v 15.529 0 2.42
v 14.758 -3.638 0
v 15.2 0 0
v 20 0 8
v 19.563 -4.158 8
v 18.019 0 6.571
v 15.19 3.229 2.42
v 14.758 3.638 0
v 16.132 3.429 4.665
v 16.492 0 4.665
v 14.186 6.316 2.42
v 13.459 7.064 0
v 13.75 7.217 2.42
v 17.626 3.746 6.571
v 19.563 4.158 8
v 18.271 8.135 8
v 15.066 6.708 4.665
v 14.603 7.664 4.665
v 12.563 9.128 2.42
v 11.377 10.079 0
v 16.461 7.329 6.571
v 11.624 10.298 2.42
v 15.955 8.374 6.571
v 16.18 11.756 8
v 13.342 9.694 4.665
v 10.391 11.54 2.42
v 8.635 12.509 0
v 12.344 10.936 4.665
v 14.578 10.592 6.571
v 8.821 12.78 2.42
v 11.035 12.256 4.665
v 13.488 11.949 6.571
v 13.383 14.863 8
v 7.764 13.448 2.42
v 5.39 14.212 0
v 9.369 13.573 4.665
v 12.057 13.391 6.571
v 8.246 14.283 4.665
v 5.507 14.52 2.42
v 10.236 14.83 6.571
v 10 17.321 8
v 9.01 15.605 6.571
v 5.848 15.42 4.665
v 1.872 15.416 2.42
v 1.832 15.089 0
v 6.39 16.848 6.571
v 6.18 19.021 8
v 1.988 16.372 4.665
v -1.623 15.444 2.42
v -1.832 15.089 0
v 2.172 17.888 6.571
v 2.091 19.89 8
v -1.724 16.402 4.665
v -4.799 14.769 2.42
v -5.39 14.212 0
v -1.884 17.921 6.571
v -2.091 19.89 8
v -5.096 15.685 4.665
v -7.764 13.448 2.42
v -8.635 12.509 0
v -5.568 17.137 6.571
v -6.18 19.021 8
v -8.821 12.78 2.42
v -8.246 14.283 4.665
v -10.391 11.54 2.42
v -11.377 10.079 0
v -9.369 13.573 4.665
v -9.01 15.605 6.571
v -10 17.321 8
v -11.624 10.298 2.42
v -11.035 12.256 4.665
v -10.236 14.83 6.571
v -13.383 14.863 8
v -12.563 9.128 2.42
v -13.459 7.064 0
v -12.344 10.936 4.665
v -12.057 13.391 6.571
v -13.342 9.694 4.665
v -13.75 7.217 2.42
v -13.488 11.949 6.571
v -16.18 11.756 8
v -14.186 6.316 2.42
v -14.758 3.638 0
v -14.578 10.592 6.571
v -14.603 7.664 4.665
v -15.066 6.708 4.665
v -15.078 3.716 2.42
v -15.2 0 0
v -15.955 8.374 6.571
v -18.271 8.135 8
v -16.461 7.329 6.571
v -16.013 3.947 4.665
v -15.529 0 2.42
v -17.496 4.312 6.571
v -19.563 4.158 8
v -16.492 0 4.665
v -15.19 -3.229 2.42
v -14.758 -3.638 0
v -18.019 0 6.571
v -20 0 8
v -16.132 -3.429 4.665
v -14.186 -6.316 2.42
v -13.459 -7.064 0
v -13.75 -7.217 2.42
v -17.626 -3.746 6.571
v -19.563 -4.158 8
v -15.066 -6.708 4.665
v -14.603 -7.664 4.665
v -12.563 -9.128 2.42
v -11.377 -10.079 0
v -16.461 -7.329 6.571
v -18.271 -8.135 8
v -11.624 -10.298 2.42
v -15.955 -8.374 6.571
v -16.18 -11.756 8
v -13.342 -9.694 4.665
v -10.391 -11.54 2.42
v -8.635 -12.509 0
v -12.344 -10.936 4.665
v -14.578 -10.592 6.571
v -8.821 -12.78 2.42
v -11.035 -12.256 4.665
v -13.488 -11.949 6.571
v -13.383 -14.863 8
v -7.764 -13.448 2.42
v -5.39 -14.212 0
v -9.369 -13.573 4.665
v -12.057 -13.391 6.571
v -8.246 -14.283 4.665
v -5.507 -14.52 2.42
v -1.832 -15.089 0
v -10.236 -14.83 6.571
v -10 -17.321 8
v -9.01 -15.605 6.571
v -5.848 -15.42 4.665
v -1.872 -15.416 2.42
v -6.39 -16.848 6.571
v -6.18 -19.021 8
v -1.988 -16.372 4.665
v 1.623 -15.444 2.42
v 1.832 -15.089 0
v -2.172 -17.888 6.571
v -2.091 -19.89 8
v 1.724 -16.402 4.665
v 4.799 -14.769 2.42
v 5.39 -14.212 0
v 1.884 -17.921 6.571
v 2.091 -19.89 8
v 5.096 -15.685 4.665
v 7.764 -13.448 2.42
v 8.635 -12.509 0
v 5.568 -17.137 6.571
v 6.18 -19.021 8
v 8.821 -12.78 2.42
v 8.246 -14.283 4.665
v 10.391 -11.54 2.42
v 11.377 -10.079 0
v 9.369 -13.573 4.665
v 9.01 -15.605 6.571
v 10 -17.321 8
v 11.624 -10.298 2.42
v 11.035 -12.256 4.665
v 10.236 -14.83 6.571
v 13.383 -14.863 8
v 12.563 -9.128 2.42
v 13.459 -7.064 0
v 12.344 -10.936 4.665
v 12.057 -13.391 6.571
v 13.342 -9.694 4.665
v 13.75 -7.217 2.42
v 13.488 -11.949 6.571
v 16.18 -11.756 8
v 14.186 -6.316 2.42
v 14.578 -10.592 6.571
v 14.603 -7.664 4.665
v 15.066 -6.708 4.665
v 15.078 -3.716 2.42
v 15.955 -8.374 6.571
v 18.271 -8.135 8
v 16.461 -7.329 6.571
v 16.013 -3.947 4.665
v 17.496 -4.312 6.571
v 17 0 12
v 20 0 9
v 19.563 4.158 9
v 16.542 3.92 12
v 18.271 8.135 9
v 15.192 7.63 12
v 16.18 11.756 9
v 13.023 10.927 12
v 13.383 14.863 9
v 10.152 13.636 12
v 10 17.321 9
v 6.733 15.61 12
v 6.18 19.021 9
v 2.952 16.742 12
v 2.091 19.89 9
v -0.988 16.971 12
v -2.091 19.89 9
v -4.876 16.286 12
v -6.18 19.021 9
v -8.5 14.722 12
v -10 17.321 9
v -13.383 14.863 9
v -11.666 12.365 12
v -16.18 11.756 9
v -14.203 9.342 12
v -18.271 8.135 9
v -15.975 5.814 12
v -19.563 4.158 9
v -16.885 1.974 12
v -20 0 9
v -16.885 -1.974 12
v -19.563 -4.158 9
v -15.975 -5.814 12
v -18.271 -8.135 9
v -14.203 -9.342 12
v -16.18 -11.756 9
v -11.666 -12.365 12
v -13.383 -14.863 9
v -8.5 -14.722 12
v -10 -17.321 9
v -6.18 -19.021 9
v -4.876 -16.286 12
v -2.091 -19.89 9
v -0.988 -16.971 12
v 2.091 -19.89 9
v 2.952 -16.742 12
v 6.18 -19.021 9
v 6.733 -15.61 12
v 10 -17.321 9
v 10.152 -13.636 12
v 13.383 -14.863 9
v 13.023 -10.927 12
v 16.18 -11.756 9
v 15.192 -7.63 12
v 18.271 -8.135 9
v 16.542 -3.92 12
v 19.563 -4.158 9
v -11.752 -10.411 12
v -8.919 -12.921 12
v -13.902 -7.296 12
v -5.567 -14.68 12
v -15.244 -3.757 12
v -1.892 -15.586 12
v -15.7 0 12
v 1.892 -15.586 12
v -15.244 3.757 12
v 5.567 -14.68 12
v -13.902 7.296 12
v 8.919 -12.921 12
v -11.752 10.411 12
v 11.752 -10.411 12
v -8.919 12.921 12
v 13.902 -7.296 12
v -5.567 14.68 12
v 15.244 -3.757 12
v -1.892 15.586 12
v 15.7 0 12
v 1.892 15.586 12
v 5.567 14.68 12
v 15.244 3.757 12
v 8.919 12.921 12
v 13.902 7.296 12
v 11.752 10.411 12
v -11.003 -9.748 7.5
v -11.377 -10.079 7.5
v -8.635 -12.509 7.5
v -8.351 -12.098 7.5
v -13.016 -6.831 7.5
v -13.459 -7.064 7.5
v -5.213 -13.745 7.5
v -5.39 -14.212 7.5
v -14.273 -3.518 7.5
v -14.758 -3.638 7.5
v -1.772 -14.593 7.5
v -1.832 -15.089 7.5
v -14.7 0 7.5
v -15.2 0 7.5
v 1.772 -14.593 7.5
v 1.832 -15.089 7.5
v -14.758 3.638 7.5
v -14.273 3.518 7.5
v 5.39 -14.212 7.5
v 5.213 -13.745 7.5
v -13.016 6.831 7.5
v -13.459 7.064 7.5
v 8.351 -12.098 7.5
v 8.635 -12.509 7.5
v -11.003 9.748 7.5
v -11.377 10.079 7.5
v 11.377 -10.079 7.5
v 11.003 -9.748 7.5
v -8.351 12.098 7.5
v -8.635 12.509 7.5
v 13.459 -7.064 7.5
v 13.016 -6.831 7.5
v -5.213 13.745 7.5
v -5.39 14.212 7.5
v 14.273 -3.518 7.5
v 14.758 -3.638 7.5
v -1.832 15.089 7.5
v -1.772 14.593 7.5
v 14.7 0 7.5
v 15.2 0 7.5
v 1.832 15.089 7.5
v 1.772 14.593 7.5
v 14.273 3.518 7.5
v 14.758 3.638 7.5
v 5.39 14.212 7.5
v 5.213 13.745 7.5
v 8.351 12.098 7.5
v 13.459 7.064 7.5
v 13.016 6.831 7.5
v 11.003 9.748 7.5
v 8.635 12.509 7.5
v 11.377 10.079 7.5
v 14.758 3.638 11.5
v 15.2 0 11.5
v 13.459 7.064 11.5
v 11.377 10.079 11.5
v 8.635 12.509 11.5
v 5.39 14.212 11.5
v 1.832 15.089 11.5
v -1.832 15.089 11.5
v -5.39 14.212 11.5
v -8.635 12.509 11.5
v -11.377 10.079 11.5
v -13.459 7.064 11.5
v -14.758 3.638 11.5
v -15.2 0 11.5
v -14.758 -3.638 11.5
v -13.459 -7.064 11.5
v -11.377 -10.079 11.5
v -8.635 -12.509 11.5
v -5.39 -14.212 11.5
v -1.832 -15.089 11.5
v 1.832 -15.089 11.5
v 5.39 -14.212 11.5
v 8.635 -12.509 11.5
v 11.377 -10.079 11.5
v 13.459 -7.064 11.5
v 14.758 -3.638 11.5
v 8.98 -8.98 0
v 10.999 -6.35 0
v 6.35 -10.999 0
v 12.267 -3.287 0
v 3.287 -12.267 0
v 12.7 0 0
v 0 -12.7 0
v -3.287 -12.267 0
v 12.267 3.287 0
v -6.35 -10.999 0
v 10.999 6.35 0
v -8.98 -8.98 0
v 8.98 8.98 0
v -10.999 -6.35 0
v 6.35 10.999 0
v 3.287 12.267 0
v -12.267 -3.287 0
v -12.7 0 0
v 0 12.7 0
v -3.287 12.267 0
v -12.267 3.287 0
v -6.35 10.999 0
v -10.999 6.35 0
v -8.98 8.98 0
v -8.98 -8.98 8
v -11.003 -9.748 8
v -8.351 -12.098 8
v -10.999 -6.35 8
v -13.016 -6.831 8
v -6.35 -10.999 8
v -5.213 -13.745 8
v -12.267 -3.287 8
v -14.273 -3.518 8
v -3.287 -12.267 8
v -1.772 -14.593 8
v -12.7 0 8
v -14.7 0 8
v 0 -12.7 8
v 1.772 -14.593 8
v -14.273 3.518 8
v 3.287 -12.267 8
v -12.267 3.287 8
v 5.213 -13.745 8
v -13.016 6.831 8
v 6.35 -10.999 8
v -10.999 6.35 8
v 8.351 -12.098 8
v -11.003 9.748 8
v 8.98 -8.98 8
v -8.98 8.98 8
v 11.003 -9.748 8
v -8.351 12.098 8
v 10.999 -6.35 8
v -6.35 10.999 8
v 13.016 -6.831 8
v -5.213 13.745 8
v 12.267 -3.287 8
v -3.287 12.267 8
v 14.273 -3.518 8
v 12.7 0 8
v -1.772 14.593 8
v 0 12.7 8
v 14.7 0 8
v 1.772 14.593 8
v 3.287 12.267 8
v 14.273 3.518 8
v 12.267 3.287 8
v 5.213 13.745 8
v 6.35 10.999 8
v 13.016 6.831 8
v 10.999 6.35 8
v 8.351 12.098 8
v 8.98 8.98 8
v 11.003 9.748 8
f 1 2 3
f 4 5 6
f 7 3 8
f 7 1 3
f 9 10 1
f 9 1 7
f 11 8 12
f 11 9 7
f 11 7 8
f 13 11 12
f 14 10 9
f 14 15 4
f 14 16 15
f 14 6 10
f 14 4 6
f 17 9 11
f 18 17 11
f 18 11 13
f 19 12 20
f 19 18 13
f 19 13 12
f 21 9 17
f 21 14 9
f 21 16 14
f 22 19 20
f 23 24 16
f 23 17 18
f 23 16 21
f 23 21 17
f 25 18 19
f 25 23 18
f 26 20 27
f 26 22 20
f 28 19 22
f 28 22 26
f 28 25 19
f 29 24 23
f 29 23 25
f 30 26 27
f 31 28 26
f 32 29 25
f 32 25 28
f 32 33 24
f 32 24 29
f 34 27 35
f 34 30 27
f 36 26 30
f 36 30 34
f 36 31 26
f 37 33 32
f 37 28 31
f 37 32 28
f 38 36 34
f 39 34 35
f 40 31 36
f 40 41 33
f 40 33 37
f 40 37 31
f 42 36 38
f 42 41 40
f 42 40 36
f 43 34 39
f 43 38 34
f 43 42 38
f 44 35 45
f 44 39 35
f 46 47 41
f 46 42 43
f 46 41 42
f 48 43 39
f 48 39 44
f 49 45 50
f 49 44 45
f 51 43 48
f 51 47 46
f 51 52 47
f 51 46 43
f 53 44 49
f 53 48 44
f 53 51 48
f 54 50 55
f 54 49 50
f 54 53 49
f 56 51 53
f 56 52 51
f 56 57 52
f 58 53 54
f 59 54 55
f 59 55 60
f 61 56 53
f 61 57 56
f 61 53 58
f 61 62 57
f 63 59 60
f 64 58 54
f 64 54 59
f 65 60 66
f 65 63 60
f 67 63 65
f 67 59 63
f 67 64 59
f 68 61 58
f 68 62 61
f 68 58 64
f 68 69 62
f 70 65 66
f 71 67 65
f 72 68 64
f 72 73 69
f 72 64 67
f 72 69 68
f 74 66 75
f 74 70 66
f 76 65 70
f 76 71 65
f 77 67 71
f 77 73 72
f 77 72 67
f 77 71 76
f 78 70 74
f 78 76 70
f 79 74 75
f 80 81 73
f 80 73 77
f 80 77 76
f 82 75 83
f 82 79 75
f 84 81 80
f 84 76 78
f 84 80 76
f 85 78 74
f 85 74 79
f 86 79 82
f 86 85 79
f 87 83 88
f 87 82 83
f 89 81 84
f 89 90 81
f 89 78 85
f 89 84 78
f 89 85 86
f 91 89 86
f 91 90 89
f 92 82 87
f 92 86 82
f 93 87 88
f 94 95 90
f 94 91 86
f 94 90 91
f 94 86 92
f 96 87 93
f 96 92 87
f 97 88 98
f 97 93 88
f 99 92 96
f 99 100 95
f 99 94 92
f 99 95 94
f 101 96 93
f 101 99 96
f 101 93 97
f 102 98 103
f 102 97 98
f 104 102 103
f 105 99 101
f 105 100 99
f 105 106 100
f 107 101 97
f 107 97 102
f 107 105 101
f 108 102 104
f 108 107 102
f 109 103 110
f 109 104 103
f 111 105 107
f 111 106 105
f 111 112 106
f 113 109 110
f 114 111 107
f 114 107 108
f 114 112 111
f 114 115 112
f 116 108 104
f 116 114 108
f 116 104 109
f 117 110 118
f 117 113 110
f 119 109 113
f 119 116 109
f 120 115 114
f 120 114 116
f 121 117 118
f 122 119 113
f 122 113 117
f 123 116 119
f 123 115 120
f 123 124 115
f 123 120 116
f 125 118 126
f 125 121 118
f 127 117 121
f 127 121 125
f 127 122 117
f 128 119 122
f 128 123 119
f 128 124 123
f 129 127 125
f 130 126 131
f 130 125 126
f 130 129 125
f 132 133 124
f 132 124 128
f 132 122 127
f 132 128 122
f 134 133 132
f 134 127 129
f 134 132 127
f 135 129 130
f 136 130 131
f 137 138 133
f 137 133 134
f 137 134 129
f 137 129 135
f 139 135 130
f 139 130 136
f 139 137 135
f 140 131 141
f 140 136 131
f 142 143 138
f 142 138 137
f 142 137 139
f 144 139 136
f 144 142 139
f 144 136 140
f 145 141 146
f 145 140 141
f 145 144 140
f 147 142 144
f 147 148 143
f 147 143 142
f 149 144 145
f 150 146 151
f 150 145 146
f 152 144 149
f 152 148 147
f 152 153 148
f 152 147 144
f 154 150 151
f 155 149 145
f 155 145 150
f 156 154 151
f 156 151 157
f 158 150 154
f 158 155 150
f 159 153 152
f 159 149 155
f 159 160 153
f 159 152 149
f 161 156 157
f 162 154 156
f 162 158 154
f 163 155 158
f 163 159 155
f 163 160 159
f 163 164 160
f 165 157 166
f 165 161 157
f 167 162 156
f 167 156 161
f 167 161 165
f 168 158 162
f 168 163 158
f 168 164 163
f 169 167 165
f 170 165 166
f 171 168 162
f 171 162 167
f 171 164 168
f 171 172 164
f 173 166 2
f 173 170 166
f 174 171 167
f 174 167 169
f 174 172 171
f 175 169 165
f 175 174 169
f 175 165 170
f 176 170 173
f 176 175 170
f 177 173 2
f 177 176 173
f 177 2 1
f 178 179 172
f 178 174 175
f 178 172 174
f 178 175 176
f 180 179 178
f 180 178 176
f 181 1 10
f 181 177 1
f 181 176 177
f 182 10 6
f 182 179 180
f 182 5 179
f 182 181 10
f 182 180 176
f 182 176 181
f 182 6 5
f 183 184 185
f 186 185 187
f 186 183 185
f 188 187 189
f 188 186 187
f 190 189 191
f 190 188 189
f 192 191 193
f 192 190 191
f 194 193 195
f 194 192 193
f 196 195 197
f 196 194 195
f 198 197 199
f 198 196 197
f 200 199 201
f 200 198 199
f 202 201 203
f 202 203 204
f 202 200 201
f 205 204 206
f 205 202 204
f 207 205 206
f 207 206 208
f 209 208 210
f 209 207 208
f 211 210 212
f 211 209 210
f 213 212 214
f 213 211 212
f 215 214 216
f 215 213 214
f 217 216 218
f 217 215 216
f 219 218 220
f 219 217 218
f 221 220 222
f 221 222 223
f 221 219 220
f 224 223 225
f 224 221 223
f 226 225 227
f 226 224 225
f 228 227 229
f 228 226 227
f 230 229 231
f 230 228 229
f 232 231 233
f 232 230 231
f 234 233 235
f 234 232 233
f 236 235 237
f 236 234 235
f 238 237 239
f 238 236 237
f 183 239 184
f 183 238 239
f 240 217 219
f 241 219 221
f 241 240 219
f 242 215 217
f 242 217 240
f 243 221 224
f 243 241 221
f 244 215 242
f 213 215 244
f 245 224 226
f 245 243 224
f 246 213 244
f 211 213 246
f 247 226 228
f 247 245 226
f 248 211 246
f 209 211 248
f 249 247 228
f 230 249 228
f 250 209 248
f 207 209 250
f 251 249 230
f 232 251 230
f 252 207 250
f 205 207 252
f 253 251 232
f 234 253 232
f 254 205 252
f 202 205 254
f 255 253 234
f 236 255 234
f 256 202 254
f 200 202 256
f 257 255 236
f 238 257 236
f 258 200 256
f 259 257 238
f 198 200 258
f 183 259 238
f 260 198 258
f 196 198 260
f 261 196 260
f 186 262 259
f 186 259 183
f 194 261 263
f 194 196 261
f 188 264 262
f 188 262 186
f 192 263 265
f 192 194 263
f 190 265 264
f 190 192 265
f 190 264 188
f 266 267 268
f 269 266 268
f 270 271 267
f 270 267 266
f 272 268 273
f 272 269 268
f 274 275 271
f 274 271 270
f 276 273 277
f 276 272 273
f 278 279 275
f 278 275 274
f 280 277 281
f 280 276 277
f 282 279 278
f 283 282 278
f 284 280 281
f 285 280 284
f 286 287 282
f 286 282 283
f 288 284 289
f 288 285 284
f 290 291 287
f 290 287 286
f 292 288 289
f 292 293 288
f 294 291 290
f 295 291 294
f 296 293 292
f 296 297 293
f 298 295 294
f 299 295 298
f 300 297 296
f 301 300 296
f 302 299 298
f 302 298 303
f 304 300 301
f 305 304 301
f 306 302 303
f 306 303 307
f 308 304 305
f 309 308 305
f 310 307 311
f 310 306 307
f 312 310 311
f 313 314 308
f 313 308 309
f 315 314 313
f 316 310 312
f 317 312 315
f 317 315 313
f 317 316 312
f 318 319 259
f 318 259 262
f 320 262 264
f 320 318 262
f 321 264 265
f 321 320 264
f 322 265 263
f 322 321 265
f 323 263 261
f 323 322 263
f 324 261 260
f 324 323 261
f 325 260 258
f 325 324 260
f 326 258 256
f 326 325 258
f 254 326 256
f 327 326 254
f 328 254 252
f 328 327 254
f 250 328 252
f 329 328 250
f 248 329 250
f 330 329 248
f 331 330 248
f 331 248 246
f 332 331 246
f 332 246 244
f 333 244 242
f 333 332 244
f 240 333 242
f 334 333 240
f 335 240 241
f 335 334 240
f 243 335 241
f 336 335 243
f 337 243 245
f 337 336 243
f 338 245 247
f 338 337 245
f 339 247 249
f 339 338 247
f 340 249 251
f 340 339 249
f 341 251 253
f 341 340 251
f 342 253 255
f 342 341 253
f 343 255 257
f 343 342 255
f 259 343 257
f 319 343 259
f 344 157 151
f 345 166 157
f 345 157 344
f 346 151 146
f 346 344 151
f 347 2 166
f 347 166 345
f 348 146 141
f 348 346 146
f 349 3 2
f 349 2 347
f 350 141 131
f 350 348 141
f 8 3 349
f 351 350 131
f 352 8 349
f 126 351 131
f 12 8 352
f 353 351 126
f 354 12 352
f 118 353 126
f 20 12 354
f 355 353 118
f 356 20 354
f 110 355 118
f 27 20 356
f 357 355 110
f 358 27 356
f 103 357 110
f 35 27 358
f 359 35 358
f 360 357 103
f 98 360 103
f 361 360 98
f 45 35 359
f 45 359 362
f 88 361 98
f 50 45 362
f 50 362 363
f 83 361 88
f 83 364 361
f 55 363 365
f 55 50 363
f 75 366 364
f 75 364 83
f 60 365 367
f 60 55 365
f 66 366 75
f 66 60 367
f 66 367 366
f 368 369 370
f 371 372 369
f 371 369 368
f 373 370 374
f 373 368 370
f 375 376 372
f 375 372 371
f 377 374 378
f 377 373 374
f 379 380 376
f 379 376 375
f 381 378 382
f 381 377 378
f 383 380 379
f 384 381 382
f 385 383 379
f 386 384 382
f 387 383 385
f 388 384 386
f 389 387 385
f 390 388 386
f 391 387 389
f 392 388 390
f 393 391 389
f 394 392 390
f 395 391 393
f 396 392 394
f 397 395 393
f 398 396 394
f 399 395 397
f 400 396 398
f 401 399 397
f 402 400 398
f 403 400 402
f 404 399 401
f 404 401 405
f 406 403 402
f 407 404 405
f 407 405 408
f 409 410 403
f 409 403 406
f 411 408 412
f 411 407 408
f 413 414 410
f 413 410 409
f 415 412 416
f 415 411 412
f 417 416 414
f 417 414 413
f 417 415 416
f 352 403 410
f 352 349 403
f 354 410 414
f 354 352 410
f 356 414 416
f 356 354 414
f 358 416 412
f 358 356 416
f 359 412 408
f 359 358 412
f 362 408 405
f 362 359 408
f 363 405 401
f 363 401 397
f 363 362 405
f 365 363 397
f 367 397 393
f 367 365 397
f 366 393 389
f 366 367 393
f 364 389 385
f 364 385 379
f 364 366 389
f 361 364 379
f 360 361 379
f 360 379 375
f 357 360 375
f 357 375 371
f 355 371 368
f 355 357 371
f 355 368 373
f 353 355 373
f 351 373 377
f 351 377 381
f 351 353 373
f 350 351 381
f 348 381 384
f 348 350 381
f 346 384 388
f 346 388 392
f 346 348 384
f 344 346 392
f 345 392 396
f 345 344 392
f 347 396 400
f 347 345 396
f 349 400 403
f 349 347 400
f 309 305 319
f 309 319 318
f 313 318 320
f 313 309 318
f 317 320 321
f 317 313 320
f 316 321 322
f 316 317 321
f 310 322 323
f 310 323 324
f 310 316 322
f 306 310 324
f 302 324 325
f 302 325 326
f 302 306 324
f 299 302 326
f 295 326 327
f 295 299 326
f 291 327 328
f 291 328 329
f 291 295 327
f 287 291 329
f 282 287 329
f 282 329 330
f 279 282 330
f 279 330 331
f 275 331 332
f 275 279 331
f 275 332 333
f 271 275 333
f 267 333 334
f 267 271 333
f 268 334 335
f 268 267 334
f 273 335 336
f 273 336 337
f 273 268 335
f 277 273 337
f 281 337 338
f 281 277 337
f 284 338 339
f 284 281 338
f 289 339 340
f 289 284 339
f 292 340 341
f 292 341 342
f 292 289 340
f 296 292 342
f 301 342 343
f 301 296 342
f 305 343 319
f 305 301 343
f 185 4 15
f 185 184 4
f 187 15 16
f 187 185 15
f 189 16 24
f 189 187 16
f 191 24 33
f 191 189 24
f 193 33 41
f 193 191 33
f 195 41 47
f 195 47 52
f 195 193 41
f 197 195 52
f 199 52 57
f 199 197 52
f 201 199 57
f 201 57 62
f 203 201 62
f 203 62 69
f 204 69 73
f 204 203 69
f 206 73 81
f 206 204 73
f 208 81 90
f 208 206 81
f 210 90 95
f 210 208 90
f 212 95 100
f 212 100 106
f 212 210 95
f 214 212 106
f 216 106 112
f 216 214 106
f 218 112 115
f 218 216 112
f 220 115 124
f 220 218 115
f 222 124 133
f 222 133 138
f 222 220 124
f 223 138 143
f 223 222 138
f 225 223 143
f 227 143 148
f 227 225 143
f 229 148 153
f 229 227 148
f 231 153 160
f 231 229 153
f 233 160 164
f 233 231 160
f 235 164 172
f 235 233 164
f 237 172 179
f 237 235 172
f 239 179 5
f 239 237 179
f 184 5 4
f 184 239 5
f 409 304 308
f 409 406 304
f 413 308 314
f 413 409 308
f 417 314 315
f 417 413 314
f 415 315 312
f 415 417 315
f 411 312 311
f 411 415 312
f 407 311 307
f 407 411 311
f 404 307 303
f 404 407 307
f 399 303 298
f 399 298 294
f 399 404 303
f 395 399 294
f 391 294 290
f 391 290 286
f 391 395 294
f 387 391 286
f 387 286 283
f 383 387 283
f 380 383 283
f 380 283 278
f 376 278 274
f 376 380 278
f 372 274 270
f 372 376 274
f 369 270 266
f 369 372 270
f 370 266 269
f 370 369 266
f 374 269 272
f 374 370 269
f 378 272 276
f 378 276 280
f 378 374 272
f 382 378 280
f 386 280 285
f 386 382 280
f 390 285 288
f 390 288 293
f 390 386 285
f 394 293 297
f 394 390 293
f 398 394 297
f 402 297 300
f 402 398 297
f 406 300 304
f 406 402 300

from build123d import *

# Parameters (mm, degrees)
F2_SIZE = 0.5


with BuildPart() as f1:
    # F0 (on Front) → F1 (revolve)
    with BuildSketch(Plane.XZ):
        with BuildLine():
            Line((12.7, 8), (12.7, 0))
            Line((12.7, 0), (15.2, 0))
            ThreePointArc((15.2, 0), (16.492064, 4.664762), (20, 8))
            Line((20, 8), (20, 9))
            Line((20, 9), (17, 12))
            Line((17, 12), (15.2, 12))
            Line((15.2, 12), (15.2, 7.5))
            Line((15.2, 7.5), (14.7, 7.5))
            Line((14.7, 7.5), (14.7, 8))
            Line((14.7, 8), (12.7, 8))
        make_face()
    revolve(axis=Axis((0, 0, 6), (0, 0, 1)))

    # F2
    f2_edges = [f1.edges().sort_by_distance(p)[0] for p in [
        (-15.2, 0, 12),
    ]]
    chamfer(f2_edges, length=F2_SIZE)


solid = f1.part
